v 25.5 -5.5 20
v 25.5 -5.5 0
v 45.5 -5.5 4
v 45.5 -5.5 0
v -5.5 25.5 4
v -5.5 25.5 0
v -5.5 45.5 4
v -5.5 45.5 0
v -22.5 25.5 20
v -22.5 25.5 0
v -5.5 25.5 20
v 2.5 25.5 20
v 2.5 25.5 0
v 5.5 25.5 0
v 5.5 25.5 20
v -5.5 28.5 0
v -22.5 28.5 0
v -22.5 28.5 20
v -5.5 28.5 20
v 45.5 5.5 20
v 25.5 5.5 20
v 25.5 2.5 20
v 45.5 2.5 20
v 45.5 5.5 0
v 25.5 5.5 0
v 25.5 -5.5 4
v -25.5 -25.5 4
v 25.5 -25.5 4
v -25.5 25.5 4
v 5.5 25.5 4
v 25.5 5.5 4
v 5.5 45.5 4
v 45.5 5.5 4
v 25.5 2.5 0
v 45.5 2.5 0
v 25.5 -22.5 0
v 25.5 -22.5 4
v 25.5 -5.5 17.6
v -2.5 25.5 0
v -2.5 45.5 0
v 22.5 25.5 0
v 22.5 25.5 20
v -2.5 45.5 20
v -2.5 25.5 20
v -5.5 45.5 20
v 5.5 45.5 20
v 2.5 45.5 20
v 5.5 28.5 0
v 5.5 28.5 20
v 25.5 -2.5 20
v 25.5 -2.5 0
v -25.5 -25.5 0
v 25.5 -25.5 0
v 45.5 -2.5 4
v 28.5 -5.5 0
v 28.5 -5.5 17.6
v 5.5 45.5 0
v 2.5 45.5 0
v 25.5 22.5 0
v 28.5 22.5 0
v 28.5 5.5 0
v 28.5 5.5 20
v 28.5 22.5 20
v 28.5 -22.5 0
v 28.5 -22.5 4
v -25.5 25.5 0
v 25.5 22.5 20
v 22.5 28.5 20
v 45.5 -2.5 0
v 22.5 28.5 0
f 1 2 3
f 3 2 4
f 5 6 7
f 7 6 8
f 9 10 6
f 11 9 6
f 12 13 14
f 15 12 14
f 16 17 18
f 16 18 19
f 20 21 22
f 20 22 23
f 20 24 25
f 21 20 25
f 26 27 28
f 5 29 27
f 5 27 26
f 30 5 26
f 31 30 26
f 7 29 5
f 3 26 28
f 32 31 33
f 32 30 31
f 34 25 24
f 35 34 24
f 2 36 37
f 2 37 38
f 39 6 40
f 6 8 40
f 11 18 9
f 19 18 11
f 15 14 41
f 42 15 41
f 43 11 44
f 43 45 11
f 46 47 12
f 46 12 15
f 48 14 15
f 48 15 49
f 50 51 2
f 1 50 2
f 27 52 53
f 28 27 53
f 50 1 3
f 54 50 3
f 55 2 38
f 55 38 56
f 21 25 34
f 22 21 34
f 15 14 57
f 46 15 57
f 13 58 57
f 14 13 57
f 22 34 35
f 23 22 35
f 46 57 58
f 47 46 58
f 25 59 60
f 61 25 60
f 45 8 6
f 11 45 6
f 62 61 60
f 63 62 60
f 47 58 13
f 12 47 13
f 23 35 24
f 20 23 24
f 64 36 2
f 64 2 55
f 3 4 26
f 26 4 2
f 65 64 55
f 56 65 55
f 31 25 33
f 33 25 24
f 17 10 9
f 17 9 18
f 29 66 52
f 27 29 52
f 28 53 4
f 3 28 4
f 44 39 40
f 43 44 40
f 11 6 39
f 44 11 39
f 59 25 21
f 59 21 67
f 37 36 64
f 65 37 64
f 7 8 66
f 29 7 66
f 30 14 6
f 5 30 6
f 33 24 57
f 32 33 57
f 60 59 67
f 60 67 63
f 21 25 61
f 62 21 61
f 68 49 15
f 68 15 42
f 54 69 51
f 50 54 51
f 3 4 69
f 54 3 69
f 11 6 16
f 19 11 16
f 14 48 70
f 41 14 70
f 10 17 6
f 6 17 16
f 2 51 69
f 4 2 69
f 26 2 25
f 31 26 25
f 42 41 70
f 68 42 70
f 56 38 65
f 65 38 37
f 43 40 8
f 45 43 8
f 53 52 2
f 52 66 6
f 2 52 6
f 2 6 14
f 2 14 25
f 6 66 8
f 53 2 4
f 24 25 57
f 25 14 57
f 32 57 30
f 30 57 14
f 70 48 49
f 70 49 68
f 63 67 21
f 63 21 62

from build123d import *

# Parameters (mm, degrees)
F1_DEPTH = 4
F2_W     = 3
F2_H     = 17
F3_DEPTH = 20
F2_W_2   = 17
F2_H_2   = 3
F4_DEPTH = 20
F6_DEPTH = 3
F8_DEPTH = 3


with BuildPart() as f1:
    # F0 (on Top) → F1 (new body)
    with BuildSketch(Plane.XY):
        Polygon((-25.5, -25.5), (25.5, -25.5), (25.5, -5.5), (25.5, 5.5), (25.5, 25.5), (5.5, 25.5), (-5.5, 25.5), (-25.5, 25.5), align=None)
        Polygon((25.5, -5.5), (25.5, -25.5), (45.5, -5.5), align=None)
        Polygon((-5.5, 45.5), (-25.5, 25.5), (-5.5, 25.5), align=None)
        Polygon((25.5, 25.5), (25.5, 5.5), (45.5, 5.5), align=None)
        Polygon((5.5, 25.5), (25.5, 25.5), (5.5, 45.5), align=None)
    extrude(amount=F1_DEPTH)


with BuildPart() as f3:
    # F2 (on Top) → F3 (new body)
    with BuildSketch(Plane.XY):
        with Locations((27, -14)):
            Rectangle(F2_W, F2_H)
    extrude(amount=F3_DEPTH)

    # F5 (on face) → F6 (cut, through all)
    with BuildSketch(Plane(origin=(25.5, 0, 0), x_dir=(0, -1, 0), z_dir=(-1, 0, 0))):
        Polygon((5.5, 20), (5.5, 17.6), (22.5, 4), (22.5, 20), align=None)
    extrude(amount=-F6_DEPTH, mode=Mode.SUBTRACT)


with BuildPart() as f3b:
    # F2 (on Top) → F3, piece 2 (new body)
    with BuildSketch(Plane.XY):
        with Locations((27, 14)):
            Rectangle(F2_W, F2_H)
    extrude(amount=F3_DEPTH)


with BuildPart() as f3c:
    # F2 (on Top) → F3, piece 3 (new body)
    with BuildSketch(Plane.XY):
        with Locations((14, 27)):
            Rectangle(F2_W_2, F2_H_2)
    extrude(amount=F3_DEPTH)


with BuildPart() as f3d:
    # F2 (on Top) → F3, piece 4 (new body)
    with BuildSketch(Plane.XY):
        with Locations((-14, 27)):
            Rectangle(F2_W_2, F2_H_2)
    extrude(amount=F3_DEPTH)


with BuildPart() as f4:
    # F2 (on Top) → F4 (new body)
    with BuildSketch(Plane.XY):
        Polygon((28.5, 5.5), (25.5, 5.5), (25.5, 2.5), (45.5, 2.5), (45.5, 5.5), align=None)
    extrude(amount=F4_DEPTH)


with BuildPart() as f4b:
    # F2 (on Top) → F4, piece 2 (new body)
    with BuildSketch(Plane.XY):
        Polygon((45.5, -2.5), (25.5, -2.5), (25.5, -5.5), (28.5, -5.5), (45.5, -5.5), align=None)
    extrude(amount=F4_DEPTH)

    # F7 (on face) → F8 (cut, through all)
    with BuildSketch(Plane.XZ.offset(5.5)):
        Polygon((45.5, 20), (25.5, 20), (45.5, 4), align=None)
    extrude(amount=-F8_DEPTH, mode=Mode.SUBTRACT)


with BuildPart() as f4c:
    # F2 (on Top) → F4, piece 3 (new body)
    with BuildSketch(Plane.XY):
        Polygon((2.5, 45.5), (2.5, 25.5), (5.5, 25.5), (5.5, 28.5), (5.5, 45.5), align=None)
    extrude(amount=F4_DEPTH)


with BuildPart() as f4d:
    # F2 (on Top) → F4, piece 4 (new body)
    with BuildSketch(Plane.XY):
        Polygon((-5.5, 28.5), (-5.5, 25.5), (-2.5, 25.5), (-2.5, 45.5), (-5.5, 45.5), align=None)
    extrude(amount=F4_DEPTH)


solid = Compound([f1.part, f3.part, f3b.part, f3c.part, f3d.part, f4.part, f4b.part, f4c.part, f4d.part])
